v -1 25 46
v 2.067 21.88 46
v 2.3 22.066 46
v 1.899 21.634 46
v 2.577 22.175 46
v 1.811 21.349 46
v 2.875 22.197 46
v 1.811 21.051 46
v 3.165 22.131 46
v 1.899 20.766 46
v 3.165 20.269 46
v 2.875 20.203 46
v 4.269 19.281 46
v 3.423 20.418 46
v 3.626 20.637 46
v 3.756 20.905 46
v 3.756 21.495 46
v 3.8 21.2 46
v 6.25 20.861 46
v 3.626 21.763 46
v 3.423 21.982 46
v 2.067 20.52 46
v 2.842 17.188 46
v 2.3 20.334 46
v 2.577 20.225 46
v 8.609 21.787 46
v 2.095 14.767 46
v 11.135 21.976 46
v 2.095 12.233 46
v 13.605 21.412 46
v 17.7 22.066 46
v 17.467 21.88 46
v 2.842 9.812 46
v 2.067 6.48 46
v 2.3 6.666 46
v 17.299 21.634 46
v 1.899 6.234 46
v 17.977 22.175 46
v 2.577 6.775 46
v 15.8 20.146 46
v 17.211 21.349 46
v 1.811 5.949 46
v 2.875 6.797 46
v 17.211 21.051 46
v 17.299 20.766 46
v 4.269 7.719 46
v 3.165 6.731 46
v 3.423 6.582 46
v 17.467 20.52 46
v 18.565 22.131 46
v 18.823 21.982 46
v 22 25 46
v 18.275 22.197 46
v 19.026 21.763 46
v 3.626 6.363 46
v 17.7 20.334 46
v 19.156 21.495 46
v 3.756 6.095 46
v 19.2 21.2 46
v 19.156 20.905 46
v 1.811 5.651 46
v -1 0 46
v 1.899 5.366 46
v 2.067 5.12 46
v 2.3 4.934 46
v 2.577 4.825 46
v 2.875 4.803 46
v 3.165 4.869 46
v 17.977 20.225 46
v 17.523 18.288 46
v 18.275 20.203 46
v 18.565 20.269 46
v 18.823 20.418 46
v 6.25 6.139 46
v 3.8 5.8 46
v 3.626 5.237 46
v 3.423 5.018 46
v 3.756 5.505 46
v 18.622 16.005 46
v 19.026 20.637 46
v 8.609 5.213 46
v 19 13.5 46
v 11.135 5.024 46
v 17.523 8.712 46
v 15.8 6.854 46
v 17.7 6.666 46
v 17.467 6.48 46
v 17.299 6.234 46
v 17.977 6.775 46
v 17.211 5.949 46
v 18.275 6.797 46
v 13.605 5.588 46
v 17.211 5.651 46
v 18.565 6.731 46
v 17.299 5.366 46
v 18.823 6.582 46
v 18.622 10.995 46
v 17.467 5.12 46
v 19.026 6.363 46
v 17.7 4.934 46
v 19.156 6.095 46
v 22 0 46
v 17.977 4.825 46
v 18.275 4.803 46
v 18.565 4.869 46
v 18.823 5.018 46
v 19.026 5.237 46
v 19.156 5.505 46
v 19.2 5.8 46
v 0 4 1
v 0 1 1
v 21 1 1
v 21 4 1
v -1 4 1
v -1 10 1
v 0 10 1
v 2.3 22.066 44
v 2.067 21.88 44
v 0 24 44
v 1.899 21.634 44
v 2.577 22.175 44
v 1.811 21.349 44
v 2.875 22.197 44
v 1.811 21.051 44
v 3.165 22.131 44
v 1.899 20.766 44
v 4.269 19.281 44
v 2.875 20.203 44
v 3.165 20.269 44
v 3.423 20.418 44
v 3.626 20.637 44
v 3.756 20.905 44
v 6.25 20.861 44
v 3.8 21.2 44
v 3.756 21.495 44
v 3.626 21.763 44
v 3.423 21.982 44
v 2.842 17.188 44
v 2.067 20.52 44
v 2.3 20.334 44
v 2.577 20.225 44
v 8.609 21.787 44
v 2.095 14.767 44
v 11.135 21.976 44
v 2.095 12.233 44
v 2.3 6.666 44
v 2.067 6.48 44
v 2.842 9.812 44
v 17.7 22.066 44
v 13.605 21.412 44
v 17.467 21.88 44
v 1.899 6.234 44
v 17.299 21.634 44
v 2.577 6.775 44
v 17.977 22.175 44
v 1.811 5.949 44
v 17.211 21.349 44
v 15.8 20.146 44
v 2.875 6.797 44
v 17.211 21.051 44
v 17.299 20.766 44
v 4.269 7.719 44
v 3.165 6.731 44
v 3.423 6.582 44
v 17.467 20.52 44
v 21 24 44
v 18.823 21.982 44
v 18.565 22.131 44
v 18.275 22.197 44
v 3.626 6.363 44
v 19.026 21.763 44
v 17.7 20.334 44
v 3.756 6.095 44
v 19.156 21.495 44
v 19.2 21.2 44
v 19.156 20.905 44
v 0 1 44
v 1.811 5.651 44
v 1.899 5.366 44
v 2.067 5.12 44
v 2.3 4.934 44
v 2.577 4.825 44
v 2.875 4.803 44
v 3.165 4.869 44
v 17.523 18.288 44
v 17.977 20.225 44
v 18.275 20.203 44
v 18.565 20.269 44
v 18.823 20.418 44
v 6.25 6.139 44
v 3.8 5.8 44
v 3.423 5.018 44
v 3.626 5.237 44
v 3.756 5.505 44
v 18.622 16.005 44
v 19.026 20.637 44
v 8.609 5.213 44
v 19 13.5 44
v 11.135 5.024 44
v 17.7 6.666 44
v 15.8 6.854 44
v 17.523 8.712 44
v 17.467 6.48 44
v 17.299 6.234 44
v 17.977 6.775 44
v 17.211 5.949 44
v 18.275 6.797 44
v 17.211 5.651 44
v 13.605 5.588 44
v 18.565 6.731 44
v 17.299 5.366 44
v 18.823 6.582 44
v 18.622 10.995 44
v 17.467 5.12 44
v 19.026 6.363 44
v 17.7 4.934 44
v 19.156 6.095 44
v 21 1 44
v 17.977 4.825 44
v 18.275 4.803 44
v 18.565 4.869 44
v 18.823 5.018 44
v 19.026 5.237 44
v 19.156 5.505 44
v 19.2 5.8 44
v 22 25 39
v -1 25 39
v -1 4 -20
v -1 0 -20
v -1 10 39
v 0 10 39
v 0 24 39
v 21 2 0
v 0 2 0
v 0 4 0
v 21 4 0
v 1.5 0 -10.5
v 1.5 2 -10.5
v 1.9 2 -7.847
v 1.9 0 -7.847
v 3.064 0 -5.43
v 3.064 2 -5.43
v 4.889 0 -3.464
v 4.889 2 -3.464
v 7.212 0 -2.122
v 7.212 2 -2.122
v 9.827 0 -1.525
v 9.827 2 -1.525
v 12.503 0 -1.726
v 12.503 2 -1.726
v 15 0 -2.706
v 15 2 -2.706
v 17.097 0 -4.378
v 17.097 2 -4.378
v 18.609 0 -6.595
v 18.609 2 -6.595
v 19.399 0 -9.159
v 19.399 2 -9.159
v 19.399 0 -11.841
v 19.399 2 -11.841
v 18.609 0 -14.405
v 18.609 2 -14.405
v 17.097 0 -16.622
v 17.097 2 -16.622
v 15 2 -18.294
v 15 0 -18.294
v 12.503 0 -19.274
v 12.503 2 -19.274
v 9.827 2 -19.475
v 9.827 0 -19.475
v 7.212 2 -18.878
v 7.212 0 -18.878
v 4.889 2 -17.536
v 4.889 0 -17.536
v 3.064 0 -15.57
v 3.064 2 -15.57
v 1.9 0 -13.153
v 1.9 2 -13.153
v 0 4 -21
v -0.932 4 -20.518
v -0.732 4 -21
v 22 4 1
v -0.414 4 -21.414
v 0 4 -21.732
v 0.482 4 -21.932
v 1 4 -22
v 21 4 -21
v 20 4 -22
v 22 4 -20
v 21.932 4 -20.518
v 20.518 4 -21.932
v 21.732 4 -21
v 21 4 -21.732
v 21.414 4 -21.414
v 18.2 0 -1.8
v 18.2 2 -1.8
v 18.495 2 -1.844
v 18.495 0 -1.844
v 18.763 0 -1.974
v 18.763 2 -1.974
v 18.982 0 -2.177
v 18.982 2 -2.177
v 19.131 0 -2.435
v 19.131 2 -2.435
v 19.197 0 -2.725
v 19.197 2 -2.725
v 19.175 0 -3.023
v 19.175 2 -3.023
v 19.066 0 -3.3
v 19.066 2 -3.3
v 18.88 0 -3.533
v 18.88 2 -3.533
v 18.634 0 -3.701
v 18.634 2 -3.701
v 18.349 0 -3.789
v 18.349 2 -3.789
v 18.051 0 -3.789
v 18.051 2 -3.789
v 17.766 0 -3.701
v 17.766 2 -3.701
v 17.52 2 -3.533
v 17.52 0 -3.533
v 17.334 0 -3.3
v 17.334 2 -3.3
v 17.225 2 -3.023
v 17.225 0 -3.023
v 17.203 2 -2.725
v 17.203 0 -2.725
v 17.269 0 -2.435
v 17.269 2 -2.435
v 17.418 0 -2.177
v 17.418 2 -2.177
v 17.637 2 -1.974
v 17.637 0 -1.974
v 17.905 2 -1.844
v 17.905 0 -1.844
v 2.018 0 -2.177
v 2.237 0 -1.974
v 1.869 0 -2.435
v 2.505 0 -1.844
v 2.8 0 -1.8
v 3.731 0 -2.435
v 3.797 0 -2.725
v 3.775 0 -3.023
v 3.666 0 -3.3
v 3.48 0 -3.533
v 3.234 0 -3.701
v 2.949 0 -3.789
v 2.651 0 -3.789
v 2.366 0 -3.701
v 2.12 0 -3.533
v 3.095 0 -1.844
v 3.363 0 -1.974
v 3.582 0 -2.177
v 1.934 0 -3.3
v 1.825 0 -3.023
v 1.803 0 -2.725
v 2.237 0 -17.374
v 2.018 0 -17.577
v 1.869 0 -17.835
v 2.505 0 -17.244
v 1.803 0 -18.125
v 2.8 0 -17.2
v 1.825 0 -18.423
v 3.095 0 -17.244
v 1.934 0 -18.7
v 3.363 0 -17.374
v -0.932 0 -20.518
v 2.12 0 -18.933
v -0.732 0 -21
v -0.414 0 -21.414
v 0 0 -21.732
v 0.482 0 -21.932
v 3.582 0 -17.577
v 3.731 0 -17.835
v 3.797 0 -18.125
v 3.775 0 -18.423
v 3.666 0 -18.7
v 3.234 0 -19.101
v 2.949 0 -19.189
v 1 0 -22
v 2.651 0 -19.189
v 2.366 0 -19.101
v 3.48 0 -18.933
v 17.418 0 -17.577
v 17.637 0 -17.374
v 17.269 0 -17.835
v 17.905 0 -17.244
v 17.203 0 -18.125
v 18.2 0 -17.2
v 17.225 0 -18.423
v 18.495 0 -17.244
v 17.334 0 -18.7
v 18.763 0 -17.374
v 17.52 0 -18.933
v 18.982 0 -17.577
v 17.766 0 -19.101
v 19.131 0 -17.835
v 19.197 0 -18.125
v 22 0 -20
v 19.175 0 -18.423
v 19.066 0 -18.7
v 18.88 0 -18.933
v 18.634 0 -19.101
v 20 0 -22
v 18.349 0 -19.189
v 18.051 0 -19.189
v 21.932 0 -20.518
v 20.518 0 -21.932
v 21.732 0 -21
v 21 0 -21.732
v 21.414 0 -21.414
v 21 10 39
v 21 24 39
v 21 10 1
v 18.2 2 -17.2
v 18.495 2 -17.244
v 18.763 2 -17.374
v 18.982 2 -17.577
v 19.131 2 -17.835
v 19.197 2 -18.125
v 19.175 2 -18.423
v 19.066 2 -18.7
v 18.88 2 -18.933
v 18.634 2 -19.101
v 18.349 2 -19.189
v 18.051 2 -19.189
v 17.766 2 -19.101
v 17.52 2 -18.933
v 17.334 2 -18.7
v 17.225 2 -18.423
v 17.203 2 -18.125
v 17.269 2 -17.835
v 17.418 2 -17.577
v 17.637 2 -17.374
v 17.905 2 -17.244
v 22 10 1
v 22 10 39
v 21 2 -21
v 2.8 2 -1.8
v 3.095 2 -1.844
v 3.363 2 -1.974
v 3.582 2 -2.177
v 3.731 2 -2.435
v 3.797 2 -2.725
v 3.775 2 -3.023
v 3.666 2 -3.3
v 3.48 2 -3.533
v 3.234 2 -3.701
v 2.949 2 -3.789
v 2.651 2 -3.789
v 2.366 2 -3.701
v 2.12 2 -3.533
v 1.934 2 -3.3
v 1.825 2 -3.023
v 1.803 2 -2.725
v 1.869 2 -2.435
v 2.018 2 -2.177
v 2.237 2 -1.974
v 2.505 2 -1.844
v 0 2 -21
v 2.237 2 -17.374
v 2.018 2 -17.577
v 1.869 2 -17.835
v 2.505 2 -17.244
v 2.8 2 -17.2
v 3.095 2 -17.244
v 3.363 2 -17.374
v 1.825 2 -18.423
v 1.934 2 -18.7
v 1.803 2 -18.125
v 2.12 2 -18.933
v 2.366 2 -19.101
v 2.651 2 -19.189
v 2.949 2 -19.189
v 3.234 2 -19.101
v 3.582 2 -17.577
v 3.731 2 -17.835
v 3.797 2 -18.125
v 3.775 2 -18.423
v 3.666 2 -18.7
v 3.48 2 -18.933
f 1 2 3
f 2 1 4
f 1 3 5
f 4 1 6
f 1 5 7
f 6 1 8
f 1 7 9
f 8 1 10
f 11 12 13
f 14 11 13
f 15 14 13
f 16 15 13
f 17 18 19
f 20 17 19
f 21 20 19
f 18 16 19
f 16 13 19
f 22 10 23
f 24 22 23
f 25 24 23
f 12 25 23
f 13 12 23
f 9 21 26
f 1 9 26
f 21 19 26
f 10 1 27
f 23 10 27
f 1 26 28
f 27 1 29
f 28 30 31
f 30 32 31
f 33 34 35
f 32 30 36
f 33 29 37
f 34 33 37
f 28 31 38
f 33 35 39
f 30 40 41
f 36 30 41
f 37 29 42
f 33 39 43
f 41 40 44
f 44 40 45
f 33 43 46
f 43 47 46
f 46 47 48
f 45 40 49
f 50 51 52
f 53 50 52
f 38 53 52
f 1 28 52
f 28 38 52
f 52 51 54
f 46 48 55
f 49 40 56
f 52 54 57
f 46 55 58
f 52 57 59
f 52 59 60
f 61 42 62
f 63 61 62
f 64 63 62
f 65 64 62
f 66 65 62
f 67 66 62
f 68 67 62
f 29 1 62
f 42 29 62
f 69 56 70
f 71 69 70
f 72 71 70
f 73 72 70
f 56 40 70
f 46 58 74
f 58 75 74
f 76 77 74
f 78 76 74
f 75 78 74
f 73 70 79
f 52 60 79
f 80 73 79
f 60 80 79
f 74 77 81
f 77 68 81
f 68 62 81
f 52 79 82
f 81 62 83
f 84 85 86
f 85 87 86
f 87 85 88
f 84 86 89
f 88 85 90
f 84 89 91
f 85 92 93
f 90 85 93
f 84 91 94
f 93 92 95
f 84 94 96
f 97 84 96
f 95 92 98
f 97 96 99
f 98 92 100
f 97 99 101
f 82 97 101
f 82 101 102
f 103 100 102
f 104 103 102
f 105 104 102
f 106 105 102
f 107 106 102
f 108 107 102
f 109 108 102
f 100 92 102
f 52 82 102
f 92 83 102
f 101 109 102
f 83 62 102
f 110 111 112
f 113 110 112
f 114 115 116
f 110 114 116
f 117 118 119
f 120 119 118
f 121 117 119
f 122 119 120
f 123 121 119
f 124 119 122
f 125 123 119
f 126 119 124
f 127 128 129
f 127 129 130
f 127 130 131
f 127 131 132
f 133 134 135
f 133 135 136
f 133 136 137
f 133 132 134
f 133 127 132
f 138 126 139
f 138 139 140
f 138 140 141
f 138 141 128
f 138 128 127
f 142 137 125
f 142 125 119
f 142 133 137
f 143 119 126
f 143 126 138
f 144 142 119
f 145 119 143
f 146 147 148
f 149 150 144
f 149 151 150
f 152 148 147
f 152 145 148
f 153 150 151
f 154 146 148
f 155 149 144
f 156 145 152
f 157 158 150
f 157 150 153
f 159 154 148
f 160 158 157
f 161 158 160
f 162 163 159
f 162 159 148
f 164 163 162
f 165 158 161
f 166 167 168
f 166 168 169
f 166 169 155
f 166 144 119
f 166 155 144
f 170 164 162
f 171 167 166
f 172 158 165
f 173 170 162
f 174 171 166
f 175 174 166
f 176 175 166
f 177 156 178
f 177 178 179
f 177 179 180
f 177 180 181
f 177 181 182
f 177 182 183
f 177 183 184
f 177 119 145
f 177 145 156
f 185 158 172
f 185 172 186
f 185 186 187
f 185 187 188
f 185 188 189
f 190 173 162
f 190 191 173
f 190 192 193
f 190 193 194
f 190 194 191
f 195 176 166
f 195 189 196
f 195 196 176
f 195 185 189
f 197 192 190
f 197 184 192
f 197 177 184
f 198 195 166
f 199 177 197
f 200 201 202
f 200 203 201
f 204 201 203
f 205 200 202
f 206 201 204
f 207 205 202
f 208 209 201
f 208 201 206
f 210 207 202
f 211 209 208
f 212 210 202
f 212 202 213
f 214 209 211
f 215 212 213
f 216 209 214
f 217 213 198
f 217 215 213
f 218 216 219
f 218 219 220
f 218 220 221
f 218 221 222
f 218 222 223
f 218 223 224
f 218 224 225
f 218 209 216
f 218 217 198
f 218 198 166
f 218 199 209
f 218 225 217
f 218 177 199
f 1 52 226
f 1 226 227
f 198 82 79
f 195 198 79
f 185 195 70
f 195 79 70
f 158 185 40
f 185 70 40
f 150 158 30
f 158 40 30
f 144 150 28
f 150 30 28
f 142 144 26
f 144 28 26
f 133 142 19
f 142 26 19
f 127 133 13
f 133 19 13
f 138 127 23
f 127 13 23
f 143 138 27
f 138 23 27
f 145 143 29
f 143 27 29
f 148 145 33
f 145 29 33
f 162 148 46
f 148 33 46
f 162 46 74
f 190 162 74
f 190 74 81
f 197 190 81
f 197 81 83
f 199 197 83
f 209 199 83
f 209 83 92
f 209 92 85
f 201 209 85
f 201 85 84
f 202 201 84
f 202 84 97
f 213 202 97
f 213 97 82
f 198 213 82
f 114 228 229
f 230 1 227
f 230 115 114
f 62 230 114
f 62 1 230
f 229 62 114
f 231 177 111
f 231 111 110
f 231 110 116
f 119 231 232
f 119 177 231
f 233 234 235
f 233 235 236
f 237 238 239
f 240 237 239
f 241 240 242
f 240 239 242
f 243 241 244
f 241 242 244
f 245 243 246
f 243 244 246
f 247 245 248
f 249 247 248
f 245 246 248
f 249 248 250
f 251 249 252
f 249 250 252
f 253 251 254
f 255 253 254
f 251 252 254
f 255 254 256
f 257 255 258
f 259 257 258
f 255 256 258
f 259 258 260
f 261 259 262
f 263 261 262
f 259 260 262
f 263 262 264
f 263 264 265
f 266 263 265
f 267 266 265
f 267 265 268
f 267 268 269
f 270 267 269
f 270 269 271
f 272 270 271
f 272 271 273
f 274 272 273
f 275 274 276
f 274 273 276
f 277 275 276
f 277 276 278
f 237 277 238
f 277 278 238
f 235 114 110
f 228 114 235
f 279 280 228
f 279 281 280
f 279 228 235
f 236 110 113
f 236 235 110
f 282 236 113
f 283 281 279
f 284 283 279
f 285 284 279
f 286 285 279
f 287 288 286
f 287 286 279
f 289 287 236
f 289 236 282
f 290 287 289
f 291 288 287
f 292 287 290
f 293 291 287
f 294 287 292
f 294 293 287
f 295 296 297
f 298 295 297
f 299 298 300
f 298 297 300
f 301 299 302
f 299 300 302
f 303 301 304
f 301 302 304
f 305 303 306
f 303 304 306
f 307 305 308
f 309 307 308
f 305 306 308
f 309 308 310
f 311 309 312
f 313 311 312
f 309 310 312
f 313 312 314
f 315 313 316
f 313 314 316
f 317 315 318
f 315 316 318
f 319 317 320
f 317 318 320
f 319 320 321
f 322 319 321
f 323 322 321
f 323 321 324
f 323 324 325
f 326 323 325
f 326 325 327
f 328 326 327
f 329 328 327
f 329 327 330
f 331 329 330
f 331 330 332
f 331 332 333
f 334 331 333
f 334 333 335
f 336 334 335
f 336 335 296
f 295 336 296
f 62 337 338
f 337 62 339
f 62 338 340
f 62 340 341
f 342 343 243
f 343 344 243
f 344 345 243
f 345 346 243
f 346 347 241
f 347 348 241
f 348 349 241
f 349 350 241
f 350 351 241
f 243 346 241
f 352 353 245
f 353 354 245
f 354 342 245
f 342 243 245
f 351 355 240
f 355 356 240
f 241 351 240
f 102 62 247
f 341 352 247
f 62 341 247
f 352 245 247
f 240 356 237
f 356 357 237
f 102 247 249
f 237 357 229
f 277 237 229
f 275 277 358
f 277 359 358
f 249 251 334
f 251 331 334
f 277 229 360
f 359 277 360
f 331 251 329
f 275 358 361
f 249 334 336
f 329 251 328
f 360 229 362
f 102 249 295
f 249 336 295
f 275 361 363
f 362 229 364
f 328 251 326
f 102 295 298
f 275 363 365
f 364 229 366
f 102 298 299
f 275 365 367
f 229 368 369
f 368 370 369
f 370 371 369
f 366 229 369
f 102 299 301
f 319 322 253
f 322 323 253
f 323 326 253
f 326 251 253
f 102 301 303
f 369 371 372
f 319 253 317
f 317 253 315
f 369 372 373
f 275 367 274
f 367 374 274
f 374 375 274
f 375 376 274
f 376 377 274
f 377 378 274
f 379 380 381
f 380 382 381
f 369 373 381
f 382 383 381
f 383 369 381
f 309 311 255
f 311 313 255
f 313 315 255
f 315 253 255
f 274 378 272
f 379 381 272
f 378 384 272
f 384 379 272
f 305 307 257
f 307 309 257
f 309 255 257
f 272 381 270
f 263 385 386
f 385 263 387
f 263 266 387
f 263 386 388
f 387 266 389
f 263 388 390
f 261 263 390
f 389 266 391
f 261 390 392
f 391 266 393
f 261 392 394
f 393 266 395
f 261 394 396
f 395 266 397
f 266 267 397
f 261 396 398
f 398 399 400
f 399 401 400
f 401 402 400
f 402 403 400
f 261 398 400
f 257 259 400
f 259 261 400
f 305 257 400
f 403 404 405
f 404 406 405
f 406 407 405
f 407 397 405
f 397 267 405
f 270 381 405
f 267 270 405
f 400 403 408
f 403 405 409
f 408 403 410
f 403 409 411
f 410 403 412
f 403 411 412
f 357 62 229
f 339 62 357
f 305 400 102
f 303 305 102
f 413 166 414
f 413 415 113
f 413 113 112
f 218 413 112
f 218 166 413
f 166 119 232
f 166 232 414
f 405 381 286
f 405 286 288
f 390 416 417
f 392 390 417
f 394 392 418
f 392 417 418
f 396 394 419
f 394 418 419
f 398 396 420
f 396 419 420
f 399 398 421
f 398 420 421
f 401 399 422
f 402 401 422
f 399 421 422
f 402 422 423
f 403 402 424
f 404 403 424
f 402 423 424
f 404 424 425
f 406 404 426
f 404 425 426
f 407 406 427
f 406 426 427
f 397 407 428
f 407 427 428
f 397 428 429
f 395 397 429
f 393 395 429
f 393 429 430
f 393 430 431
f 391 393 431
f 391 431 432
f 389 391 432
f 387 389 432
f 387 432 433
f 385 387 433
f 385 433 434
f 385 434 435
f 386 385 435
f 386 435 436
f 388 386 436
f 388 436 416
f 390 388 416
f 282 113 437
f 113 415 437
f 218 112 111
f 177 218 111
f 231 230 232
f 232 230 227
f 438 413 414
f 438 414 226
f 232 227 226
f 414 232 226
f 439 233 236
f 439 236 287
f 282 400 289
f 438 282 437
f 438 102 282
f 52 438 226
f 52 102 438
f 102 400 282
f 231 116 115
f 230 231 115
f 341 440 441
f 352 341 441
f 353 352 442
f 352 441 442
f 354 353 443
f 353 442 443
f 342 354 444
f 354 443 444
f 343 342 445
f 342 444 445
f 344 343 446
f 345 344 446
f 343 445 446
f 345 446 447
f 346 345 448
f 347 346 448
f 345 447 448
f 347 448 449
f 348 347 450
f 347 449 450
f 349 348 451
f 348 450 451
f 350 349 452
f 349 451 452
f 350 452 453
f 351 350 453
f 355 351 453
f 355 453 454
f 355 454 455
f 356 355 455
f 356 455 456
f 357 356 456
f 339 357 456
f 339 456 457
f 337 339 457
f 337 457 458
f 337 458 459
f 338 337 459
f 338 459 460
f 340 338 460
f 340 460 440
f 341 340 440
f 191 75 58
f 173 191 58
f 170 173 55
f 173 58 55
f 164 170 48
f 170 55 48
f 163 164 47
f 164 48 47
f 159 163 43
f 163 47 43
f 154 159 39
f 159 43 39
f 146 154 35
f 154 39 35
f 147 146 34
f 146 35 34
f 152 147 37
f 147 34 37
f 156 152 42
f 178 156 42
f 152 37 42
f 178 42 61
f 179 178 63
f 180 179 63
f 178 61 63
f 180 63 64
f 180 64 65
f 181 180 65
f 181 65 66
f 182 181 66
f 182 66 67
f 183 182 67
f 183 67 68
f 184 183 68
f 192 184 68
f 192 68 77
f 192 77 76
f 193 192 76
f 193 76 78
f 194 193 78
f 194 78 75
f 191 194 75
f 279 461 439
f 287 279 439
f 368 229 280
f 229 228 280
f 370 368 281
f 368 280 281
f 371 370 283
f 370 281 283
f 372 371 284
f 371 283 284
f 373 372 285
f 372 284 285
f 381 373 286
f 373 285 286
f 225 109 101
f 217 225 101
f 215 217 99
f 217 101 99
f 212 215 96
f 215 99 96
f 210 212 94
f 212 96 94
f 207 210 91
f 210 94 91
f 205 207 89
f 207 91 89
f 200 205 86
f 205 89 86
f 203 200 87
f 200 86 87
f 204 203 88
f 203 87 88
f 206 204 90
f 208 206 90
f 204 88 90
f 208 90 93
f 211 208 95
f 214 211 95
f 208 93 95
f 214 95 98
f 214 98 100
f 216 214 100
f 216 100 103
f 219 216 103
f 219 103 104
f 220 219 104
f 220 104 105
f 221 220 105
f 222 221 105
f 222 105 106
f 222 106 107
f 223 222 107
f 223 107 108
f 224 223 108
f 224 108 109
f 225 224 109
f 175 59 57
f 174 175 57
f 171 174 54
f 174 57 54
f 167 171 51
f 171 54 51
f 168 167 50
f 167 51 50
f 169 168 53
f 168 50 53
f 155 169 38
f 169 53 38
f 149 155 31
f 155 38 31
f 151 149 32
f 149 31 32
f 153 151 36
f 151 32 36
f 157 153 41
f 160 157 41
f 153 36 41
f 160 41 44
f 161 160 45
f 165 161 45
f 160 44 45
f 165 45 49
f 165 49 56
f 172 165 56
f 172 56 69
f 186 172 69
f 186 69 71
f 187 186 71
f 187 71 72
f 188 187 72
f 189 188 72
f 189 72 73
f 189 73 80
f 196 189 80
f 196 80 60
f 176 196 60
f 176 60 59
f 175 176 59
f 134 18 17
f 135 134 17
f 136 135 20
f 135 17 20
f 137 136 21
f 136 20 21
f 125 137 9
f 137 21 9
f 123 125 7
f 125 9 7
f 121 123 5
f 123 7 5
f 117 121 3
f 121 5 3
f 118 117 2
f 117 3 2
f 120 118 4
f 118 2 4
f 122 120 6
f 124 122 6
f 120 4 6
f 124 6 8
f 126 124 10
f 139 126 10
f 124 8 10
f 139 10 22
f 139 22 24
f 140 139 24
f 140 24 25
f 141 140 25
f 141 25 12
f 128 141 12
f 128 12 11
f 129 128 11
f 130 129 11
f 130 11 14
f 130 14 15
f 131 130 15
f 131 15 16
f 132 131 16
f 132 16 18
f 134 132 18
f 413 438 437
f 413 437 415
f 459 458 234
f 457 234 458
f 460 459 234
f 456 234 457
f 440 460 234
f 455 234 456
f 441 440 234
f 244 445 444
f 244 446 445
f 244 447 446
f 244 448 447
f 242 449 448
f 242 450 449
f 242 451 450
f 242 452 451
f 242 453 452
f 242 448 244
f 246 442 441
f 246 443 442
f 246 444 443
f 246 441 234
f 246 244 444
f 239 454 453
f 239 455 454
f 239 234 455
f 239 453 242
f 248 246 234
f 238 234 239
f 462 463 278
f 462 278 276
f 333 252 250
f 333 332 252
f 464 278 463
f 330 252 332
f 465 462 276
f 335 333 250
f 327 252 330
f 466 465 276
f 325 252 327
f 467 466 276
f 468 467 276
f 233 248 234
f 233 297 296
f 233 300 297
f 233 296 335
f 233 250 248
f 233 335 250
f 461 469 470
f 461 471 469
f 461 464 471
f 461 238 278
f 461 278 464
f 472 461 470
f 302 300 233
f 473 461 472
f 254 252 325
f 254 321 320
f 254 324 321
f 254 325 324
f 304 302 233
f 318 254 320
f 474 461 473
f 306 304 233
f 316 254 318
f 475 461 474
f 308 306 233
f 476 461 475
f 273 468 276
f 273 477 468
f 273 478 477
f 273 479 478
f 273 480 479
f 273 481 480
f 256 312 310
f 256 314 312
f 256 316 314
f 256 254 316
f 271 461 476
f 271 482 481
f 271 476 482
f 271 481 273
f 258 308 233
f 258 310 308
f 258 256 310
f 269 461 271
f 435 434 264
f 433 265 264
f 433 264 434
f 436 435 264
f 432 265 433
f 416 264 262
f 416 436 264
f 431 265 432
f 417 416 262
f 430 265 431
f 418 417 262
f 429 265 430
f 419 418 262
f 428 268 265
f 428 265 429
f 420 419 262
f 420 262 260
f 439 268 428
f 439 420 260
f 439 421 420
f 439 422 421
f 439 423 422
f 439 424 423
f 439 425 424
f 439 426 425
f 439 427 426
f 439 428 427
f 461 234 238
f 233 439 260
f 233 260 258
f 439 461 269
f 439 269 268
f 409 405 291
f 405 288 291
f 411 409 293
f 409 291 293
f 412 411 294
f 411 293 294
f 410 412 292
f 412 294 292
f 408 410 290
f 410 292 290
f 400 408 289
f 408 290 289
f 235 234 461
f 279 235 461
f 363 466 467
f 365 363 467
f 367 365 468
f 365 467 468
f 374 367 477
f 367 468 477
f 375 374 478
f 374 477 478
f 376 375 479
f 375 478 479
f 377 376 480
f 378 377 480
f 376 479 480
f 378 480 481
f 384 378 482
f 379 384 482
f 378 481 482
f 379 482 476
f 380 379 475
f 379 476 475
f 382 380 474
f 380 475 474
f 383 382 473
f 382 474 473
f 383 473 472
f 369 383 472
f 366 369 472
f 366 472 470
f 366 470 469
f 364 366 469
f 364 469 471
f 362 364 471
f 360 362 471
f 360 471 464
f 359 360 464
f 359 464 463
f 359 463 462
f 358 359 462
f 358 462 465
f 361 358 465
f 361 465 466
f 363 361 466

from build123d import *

# Parameters (mm, degrees)
SKETCH_1_W           = 23
SKETCH_1_H           = 23
SKETCH_1_W_2         = 21
SKETCH_1_H_2         = 21
EXTRUDE_1_DEPTH      = 4
SKETCH_2_W           = 21
SKETCH_2_H           = 21
EXTRUDE_2_DEPTH      = 2
CUT_EXTRUDE_1_DEPTH  = 2
FILLET_2_R           = 2
FILLET_3_R           = 2
EXTRUDE_6_DEPTH      = 45
SKETCH_19_W          = 23
SKETCH_19_H          = 2
EXTRUDE_7_DEPTH      = 24
SKETCH_4_R           = 1
CUT_EXTRUDE_9_DEPTH  = 20
EXTRUDE_8_DEPTH      = 5
SKETCH_22_R          = 8.5
SKETCH_22_R_2        = 1
CUT_EXTRUDE_11_DEPTH = 5


with BuildPart() as part:
    # 草图1 → 凸台-拉伸1 (new body)
    with BuildSketch(Plane(origin=(0, 0, 0), x_dir=(1, 0, 0), z_dir=(0, 1, 0))):
        with Locations((10.5, 10.5)):
            Rectangle(SKETCH_1_W, SKETCH_1_H)
        with Locations((10.5, 10.5)):
            Rectangle(SKETCH_1_W_2, SKETCH_1_H_2, mode=Mode.SUBTRACT)
    extrude(amount=EXTRUDE_1_DEPTH)

    # 草图2 → 凸台-拉伸2 (add)
    with BuildSketch(Plane(origin=(0, 0, 0), x_dir=(1, 0, 0), z_dir=(0, 1, 0))):
        with Locations((10.5, 10.5)):
            Rectangle(SKETCH_2_W, SKETCH_2_H)
    extrude(amount=EXTRUDE_2_DEPTH)

    # 草图3 → 切除-拉伸1 (cut)
    with BuildSketch(Plane(origin=(0, 2, 0), x_dir=(1, 0, 0), z_dir=(0, 1, 0))):
        with BuildLine():
            ThreePointArc((19.5, 10.5), (10.5, 19.5), (1.5, 10.5))
            Line((1.5, 10.5), (19.5, 10.5))
        make_face()
        with BuildLine():
            Line((19.5, 10.5), (1.5, 10.5))
            ThreePointArc((1.5, 10.5), (10.5, 1.5), (19.5, 10.5))
        make_face()
    extrude(amount=-CUT_EXTRUDE_1_DEPTH, mode=Mode.SUBTRACT)

    # 圆角2
    fillet_2_edges = [part.edges().sort_by_distance(p)[0] for p in [
        (-1, 2, -22),
    ]]
    fillet(fillet_2_edges, radius=FILLET_2_R)

    # 圆角3
    fillet_3_edges = [part.edges().sort_by_distance(p)[0] for p in [
        (22, 2, -22),
    ]]
    fillet(fillet_3_edges, radius=FILLET_3_R)

    # 草图18 → 凸台-拉伸6 (add)
    with BuildSketch(Plane.XY.offset(1)):
        Polygon((-1, 0), (22, 0), (22, 10), (21, 10), (21, 1), (0, 1), (0, 10), (-1, 10), align=None)
    extrude(amount=EXTRUDE_6_DEPTH)

    # 草图19 → 凸台-拉伸7 (add)
    with BuildSketch(Plane(origin=(0, 1, 0), x_dir=(1, 0, 0), z_dir=(0, 1, 0))):
        with Locations((10.5, -45)):
            Rectangle(SKETCH_19_W, SKETCH_19_H)
    extrude(amount=EXTRUDE_7_DEPTH)

    # 草图4 → 切除-拉伸9 (cut)
    with BuildSketch(Plane(origin=(0, 2, 0), x_dir=(1, 0, 0), z_dir=(0, 1, 0))):
        with Locations(Location((2.8, 18.2, 0), (0, 0, 270))):
            Circle(SKETCH_4_R)
        with Locations(Location((2.8, 2.8, 0), (0, 0, 270))):
            Circle(SKETCH_4_R)
        with Locations(Location((18.2, 2.8, 0), (0, 0, 270))):
            Circle(SKETCH_4_R)
        with Locations(Location((18.2, 18.2, 0), (0, 0, 270))):
            Circle(SKETCH_4_R)
    extrude(amount=-CUT_EXTRUDE_9_DEPTH, mode=Mode.SUBTRACT)

    # 草图24 → 凸台-拉伸8 (add)
    with BuildSketch(Plane(origin=(0, 0, 44), x_dir=(-1, 0, 0), z_dir=(0, 0, -1))):
        Polygon((-22, 10), (-22, 25), (1, 25), (1, 10), (0, 10), (0, 24), (-21, 24), (-21, 10), align=None)
    extrude(amount=EXTRUDE_8_DEPTH)

    # 草图22 → 切除-拉伸11 (cut)
    with BuildSketch(Plane.XY.offset(46)):
        with Locations((10.5, 13.5)):
            Circle(SKETCH_22_R)
        with Locations((18.2, 21.2)):
            Circle(SKETCH_22_R_2)
        with Locations((2.8, 21.2)):
            Circle(SKETCH_22_R_2)
        with Locations((2.8, 5.8)):
            Circle(SKETCH_22_R_2)
        with Locations((18.2, 5.8)):
            Circle(SKETCH_22_R_2)
    extrude(amount=-CUT_EXTRUDE_11_DEPTH, mode=Mode.SUBTRACT)


solid = part.part
